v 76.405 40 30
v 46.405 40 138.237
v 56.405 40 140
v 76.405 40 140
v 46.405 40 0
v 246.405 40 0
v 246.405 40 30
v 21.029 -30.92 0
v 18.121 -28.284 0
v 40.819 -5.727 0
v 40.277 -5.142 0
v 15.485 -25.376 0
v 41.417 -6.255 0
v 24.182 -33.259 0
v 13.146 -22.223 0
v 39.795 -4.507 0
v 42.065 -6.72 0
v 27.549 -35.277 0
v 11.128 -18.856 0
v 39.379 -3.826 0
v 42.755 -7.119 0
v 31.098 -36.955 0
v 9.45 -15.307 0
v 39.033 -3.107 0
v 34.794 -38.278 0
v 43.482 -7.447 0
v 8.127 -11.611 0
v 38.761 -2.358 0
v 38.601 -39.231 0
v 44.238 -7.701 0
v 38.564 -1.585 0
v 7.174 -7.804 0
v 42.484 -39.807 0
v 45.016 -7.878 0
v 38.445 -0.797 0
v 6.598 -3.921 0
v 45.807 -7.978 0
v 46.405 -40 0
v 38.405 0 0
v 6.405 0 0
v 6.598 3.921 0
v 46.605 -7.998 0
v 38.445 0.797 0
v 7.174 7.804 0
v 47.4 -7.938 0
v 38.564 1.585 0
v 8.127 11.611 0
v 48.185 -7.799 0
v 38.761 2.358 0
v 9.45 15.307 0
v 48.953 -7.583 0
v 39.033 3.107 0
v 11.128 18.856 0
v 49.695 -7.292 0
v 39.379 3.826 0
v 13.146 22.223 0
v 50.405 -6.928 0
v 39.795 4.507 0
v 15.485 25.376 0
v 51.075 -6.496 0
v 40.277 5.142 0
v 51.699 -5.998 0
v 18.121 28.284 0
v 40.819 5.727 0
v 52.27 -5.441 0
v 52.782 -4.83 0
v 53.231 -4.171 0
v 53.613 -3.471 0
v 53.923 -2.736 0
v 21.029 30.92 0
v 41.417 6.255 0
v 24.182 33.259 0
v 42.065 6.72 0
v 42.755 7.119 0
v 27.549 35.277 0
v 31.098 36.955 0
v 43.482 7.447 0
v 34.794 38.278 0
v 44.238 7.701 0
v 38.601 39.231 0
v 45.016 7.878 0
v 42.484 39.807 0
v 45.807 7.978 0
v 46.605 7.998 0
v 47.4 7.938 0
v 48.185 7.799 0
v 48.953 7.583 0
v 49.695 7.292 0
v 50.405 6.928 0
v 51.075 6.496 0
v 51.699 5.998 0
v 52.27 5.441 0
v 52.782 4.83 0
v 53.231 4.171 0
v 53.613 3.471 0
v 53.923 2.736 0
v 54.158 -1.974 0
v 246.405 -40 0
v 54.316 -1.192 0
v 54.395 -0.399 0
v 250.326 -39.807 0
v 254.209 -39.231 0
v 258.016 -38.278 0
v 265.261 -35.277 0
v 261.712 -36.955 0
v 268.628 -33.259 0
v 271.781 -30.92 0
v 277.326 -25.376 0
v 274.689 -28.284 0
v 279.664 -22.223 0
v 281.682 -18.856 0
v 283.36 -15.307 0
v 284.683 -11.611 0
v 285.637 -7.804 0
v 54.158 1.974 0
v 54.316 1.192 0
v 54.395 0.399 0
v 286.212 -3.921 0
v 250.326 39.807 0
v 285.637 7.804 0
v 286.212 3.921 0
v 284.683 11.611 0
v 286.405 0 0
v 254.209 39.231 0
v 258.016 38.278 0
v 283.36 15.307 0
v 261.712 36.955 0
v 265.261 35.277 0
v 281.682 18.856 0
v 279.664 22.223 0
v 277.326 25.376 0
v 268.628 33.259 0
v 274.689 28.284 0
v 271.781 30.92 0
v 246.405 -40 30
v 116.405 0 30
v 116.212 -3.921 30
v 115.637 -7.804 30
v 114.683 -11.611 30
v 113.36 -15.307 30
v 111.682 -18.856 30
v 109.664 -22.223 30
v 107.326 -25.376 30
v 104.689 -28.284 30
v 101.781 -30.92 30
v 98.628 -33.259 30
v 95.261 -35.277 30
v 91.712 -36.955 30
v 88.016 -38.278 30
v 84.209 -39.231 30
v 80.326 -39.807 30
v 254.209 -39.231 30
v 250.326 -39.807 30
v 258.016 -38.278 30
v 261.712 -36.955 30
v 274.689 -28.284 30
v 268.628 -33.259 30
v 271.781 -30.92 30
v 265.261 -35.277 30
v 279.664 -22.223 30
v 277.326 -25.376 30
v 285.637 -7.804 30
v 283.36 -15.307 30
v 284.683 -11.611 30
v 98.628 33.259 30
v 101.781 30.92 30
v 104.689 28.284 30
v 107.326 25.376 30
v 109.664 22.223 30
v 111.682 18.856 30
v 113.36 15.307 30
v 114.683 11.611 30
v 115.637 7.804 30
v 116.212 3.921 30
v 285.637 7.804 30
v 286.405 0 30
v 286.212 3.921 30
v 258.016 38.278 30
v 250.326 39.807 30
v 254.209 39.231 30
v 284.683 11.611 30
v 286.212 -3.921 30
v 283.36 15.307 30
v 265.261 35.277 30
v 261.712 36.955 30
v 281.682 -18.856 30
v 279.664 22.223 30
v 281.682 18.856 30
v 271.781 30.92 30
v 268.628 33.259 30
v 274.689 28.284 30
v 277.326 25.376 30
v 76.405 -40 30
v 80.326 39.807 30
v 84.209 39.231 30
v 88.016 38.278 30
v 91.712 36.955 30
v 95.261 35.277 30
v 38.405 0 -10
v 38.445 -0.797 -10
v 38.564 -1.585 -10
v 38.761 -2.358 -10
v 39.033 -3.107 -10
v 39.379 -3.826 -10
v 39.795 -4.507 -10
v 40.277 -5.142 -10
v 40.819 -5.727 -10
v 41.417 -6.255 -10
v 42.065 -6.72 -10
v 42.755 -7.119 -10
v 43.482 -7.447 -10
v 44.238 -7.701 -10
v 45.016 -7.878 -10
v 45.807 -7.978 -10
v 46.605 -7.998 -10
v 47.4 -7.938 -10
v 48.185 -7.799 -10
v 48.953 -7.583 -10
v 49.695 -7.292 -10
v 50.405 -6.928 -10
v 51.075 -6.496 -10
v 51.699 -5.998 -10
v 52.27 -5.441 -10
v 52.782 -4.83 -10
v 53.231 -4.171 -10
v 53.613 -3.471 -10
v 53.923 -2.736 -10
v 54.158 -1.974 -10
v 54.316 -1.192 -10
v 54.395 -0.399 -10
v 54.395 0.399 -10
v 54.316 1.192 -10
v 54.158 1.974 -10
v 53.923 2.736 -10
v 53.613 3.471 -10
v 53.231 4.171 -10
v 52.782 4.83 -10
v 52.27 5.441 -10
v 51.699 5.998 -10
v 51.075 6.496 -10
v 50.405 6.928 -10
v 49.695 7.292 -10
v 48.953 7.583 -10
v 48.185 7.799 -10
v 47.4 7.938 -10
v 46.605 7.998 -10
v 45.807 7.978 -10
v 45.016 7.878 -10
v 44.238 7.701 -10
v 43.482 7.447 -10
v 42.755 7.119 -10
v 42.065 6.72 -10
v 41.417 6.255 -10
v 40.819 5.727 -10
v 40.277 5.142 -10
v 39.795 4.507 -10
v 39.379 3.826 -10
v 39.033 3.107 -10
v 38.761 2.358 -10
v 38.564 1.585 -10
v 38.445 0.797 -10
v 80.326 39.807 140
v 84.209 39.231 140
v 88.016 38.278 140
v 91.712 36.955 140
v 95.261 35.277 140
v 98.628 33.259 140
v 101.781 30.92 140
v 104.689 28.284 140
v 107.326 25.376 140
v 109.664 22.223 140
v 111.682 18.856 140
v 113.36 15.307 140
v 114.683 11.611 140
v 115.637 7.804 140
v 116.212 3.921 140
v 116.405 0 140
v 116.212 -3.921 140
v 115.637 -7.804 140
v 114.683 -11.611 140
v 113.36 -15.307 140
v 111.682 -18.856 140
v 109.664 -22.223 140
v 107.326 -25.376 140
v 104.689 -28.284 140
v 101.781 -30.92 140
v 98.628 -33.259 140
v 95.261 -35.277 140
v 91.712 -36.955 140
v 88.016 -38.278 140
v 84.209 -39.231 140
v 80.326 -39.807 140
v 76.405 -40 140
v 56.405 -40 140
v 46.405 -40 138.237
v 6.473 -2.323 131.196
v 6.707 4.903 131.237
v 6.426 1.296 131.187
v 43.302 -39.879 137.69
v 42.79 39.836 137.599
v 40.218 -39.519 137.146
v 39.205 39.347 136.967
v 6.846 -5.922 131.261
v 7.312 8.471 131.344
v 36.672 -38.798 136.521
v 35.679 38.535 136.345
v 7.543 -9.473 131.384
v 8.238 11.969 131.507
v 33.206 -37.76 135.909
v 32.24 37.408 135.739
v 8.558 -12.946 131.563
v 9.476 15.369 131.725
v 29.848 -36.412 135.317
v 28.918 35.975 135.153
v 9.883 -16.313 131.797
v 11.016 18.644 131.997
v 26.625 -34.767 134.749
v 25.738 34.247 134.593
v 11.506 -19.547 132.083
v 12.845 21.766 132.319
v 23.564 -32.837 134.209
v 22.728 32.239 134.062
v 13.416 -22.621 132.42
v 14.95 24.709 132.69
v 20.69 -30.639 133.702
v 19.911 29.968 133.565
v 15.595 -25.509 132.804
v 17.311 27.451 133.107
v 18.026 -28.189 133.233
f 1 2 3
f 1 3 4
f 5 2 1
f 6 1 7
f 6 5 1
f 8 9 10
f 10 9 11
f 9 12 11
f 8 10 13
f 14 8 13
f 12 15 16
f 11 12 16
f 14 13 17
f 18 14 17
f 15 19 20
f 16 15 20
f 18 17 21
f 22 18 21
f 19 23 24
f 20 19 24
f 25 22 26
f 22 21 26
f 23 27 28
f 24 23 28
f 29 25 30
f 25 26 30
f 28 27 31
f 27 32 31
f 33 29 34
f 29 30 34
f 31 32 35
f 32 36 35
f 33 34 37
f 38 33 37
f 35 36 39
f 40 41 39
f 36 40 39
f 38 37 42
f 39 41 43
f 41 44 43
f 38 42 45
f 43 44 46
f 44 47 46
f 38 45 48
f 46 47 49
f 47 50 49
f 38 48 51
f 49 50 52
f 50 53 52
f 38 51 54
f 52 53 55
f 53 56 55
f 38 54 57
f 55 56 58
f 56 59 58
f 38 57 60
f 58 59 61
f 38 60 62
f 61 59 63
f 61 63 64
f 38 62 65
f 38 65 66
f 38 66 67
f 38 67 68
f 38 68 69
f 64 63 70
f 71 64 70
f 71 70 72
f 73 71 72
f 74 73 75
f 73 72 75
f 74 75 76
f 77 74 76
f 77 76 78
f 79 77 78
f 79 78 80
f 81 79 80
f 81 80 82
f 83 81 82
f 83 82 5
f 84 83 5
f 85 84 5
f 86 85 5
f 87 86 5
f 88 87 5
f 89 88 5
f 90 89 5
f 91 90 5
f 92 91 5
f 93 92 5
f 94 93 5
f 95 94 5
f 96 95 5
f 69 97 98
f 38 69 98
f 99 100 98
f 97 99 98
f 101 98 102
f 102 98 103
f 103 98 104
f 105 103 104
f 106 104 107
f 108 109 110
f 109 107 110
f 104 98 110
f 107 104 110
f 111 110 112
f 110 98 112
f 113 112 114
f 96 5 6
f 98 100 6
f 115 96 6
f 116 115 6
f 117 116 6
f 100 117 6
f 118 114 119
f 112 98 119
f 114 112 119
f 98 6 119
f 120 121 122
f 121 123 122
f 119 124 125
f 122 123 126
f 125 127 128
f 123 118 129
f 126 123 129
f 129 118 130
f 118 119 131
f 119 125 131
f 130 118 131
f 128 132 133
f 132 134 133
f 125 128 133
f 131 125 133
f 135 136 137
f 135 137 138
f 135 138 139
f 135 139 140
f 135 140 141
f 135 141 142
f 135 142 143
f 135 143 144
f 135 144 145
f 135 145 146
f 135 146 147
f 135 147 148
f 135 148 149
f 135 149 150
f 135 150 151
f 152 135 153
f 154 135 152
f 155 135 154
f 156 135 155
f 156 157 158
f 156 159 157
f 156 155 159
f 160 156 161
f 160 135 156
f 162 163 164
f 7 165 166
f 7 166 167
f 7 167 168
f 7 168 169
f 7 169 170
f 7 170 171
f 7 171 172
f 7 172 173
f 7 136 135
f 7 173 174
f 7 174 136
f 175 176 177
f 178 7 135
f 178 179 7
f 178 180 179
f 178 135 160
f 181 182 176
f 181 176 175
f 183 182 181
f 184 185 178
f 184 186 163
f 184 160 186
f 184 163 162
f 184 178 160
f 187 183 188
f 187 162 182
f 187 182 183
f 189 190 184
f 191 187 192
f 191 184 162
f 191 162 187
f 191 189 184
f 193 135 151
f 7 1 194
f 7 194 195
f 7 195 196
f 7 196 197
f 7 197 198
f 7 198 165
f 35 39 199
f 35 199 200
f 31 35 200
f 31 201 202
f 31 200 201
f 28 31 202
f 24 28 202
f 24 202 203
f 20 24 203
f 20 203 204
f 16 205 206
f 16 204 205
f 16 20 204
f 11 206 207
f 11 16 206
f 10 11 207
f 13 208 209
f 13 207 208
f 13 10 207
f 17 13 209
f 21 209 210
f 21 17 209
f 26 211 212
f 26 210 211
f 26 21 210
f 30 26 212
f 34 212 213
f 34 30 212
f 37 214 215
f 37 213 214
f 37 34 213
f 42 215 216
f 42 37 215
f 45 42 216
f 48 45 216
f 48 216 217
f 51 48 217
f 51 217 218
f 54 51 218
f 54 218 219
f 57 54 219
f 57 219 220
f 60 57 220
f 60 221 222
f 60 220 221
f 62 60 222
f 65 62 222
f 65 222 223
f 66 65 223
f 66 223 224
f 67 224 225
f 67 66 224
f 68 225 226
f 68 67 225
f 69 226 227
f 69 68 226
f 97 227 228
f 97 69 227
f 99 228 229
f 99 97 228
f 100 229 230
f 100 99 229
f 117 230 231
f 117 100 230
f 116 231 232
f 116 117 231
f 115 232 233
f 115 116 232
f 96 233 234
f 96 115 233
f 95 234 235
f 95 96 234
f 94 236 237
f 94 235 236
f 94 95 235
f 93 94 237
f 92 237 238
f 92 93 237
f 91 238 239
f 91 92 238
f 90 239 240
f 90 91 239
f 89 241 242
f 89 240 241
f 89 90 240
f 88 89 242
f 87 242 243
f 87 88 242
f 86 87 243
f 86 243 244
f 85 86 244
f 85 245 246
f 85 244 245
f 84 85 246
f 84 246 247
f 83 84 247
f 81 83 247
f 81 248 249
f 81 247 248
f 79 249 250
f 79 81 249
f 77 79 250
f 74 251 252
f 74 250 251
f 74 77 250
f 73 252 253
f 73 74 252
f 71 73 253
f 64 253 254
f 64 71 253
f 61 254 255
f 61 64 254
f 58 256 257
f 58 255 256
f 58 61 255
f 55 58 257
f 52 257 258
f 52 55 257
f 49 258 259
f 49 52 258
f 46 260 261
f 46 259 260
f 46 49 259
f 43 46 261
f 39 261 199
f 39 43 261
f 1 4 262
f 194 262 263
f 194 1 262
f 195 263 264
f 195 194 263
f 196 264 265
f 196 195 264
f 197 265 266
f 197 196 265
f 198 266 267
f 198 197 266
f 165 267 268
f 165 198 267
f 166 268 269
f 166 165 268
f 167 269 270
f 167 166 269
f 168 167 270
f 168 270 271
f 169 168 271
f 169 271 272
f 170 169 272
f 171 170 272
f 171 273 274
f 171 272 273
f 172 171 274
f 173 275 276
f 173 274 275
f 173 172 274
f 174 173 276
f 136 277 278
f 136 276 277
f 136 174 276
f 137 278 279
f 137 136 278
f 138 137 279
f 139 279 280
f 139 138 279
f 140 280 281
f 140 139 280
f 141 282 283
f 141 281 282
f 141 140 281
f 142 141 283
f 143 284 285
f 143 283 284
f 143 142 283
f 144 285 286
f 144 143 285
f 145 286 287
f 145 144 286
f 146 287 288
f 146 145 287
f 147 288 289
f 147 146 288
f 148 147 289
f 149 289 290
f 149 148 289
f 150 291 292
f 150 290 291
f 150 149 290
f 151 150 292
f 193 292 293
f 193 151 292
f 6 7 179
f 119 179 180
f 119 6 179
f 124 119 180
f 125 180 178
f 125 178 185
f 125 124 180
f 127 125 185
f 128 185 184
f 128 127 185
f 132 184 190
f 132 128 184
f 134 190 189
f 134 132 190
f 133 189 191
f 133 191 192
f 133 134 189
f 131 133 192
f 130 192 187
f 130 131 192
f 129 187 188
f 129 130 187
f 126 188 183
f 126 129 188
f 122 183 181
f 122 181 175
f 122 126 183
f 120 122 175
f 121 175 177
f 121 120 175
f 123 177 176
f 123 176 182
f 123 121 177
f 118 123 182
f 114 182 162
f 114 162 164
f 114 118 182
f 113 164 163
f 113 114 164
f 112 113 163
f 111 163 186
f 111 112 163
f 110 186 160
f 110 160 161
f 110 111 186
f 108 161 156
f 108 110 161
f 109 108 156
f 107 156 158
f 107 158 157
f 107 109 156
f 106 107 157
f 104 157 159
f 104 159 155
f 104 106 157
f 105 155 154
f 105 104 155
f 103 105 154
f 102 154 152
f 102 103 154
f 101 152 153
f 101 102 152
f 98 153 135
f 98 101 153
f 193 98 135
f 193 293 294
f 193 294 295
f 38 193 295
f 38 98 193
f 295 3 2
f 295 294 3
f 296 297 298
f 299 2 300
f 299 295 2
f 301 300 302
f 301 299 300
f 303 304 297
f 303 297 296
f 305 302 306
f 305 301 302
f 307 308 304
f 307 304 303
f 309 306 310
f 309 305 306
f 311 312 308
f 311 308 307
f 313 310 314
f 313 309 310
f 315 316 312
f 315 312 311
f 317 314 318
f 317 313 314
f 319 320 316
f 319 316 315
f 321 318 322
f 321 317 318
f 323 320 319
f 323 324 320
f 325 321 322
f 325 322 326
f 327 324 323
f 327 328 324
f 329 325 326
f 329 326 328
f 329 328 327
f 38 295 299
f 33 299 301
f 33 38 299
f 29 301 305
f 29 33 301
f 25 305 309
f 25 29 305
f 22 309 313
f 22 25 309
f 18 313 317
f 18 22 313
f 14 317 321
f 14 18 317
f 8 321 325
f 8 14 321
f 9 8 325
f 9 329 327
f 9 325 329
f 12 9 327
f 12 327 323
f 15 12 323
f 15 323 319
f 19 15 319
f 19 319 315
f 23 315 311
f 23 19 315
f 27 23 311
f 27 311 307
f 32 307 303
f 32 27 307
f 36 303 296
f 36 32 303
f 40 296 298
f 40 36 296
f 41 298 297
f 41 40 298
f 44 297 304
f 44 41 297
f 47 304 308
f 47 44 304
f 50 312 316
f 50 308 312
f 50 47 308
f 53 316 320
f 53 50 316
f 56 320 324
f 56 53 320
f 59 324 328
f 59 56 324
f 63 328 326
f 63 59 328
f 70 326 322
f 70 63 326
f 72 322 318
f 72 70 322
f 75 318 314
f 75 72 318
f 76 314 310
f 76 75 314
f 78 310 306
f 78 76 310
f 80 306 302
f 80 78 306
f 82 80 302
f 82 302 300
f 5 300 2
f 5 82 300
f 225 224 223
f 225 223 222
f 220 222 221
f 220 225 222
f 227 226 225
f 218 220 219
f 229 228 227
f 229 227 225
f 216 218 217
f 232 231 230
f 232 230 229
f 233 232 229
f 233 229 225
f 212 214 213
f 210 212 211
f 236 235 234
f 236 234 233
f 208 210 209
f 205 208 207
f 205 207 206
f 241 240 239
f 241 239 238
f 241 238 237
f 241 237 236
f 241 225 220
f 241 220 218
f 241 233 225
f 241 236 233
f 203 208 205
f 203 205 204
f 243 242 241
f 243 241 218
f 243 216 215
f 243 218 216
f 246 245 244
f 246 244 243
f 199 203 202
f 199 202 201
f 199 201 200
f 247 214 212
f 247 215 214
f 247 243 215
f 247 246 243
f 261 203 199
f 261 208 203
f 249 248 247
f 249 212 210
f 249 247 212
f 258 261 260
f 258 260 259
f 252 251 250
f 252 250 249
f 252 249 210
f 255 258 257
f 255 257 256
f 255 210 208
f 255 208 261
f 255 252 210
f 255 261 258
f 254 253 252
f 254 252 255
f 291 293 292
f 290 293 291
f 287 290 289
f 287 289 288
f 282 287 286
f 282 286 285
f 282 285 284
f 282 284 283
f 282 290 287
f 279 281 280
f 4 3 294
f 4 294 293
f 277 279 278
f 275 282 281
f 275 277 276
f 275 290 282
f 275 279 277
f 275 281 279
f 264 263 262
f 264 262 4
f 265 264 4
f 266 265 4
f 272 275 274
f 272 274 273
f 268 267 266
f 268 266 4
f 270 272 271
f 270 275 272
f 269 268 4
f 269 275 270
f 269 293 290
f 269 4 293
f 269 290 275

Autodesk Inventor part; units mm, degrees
ref_plane "YZ Plane" through (0, 0, 0) normal (1, 0, 0) x (0, 1, 0)
ref_plane "XZ Plane" through (0, 0, 0) normal (0, 1, 0) x (-1, 0, 0)
ref_plane "XY Plane" through (0, 0, 0) normal (0, 0, 1) x (1, 0, 0)
sketch "Sketch1" plane through (0, 0, 0) normal (0, 0, 1) x (1, 0, 0)
  line L0 (0, 15.9441) -> (0, -15.9441) construction
  line L1 (11.6084, 0) -> (-11.6084, 0) construction
  line L2 (46.4051, 40) -> (246.4051, 40)
  line L3 (246.4051, 40) -> (246.4051, -40)
  line L4 (246.4051, -40) -> (46.4051, -40)
  line L5 (46.4051, -40) -> (46.4051, 40)
  circle A0 centre (46.4051, 0) radius 40
  circle A1 centre (246.4051, 0) radius 40
  point P0 (0, 0)
  point P1 (0, 0)
  dimension "d0" = 80
  dimension "d1" = 200
extrude "Extrusion1" add sketch "Sketch1" along normal blind 30
sketch "Sketch2" plane through (0, 0, 30) normal (0, 0, 1) x (1, 0, 0)
  arc A0 (46.4051, 40) -> (46.4051, -40) centre (46.4051, 0) ccw projected
  circle A1 centre (46.4051, 0) radius 40
  line L0 (46.4051, -40) -> (46.4051, 40)
  line L1 (116.4051, 0) -> (76.4051, 0)
  circle A2 centre (76.4051, 0) radius 40
  line L2 (46.4051, 40) -> (76.4051, 40)
  line L3 (76.4051, -40) -> (46.4051, -40)
  point P0 (0, 0)
extrude "Extrusion2" add sketch "Sketch2" along normal blind 110
sketch "Sketch3" plane through (46.4051, -40, 0) normal (0, -1, 0) x (1, 0, 0)
  line L0 (-40, 140) -> (0, 140) projected
  line L1 (0, 140) -> (10, 140)
  line L2 (10, 140) -> (-81.693, 123.8321)
  line L3 (-81.693, 123.8321) -> (-81.693, 140)
  line L4 (-81.693, 140) -> (0, 140)
  point P0 (-46.4051, 0)
extrude "Extrusion3" cut sketch "Sketch3" against normal through all
sketch "Sketch4" plane through (0, 0, 0) normal (0, 0, -1) x (-1, 0, 0)
  line L0 (-246.4051, -40) -> (-46.4051, -40) projected
  arc A0 (-46.4051, -40) -> (-46.4051, 40) centre (-46.4051, 0) ccw projected
  line L1 (-46.4051, 40) -> (-246.4051, 40) projected
  arc A1 (-246.4051, 40) -> (-246.4051, -40) centre (-246.4051, 0) ccw projected
  circle A2 centre (-46.4051, 0) radius 8
  point P0 (0, 0)
extrude "Extrusion4" add sketch "Sketch4" along normal blind 10 contours A2
properties part number "CANH TAY 3"
